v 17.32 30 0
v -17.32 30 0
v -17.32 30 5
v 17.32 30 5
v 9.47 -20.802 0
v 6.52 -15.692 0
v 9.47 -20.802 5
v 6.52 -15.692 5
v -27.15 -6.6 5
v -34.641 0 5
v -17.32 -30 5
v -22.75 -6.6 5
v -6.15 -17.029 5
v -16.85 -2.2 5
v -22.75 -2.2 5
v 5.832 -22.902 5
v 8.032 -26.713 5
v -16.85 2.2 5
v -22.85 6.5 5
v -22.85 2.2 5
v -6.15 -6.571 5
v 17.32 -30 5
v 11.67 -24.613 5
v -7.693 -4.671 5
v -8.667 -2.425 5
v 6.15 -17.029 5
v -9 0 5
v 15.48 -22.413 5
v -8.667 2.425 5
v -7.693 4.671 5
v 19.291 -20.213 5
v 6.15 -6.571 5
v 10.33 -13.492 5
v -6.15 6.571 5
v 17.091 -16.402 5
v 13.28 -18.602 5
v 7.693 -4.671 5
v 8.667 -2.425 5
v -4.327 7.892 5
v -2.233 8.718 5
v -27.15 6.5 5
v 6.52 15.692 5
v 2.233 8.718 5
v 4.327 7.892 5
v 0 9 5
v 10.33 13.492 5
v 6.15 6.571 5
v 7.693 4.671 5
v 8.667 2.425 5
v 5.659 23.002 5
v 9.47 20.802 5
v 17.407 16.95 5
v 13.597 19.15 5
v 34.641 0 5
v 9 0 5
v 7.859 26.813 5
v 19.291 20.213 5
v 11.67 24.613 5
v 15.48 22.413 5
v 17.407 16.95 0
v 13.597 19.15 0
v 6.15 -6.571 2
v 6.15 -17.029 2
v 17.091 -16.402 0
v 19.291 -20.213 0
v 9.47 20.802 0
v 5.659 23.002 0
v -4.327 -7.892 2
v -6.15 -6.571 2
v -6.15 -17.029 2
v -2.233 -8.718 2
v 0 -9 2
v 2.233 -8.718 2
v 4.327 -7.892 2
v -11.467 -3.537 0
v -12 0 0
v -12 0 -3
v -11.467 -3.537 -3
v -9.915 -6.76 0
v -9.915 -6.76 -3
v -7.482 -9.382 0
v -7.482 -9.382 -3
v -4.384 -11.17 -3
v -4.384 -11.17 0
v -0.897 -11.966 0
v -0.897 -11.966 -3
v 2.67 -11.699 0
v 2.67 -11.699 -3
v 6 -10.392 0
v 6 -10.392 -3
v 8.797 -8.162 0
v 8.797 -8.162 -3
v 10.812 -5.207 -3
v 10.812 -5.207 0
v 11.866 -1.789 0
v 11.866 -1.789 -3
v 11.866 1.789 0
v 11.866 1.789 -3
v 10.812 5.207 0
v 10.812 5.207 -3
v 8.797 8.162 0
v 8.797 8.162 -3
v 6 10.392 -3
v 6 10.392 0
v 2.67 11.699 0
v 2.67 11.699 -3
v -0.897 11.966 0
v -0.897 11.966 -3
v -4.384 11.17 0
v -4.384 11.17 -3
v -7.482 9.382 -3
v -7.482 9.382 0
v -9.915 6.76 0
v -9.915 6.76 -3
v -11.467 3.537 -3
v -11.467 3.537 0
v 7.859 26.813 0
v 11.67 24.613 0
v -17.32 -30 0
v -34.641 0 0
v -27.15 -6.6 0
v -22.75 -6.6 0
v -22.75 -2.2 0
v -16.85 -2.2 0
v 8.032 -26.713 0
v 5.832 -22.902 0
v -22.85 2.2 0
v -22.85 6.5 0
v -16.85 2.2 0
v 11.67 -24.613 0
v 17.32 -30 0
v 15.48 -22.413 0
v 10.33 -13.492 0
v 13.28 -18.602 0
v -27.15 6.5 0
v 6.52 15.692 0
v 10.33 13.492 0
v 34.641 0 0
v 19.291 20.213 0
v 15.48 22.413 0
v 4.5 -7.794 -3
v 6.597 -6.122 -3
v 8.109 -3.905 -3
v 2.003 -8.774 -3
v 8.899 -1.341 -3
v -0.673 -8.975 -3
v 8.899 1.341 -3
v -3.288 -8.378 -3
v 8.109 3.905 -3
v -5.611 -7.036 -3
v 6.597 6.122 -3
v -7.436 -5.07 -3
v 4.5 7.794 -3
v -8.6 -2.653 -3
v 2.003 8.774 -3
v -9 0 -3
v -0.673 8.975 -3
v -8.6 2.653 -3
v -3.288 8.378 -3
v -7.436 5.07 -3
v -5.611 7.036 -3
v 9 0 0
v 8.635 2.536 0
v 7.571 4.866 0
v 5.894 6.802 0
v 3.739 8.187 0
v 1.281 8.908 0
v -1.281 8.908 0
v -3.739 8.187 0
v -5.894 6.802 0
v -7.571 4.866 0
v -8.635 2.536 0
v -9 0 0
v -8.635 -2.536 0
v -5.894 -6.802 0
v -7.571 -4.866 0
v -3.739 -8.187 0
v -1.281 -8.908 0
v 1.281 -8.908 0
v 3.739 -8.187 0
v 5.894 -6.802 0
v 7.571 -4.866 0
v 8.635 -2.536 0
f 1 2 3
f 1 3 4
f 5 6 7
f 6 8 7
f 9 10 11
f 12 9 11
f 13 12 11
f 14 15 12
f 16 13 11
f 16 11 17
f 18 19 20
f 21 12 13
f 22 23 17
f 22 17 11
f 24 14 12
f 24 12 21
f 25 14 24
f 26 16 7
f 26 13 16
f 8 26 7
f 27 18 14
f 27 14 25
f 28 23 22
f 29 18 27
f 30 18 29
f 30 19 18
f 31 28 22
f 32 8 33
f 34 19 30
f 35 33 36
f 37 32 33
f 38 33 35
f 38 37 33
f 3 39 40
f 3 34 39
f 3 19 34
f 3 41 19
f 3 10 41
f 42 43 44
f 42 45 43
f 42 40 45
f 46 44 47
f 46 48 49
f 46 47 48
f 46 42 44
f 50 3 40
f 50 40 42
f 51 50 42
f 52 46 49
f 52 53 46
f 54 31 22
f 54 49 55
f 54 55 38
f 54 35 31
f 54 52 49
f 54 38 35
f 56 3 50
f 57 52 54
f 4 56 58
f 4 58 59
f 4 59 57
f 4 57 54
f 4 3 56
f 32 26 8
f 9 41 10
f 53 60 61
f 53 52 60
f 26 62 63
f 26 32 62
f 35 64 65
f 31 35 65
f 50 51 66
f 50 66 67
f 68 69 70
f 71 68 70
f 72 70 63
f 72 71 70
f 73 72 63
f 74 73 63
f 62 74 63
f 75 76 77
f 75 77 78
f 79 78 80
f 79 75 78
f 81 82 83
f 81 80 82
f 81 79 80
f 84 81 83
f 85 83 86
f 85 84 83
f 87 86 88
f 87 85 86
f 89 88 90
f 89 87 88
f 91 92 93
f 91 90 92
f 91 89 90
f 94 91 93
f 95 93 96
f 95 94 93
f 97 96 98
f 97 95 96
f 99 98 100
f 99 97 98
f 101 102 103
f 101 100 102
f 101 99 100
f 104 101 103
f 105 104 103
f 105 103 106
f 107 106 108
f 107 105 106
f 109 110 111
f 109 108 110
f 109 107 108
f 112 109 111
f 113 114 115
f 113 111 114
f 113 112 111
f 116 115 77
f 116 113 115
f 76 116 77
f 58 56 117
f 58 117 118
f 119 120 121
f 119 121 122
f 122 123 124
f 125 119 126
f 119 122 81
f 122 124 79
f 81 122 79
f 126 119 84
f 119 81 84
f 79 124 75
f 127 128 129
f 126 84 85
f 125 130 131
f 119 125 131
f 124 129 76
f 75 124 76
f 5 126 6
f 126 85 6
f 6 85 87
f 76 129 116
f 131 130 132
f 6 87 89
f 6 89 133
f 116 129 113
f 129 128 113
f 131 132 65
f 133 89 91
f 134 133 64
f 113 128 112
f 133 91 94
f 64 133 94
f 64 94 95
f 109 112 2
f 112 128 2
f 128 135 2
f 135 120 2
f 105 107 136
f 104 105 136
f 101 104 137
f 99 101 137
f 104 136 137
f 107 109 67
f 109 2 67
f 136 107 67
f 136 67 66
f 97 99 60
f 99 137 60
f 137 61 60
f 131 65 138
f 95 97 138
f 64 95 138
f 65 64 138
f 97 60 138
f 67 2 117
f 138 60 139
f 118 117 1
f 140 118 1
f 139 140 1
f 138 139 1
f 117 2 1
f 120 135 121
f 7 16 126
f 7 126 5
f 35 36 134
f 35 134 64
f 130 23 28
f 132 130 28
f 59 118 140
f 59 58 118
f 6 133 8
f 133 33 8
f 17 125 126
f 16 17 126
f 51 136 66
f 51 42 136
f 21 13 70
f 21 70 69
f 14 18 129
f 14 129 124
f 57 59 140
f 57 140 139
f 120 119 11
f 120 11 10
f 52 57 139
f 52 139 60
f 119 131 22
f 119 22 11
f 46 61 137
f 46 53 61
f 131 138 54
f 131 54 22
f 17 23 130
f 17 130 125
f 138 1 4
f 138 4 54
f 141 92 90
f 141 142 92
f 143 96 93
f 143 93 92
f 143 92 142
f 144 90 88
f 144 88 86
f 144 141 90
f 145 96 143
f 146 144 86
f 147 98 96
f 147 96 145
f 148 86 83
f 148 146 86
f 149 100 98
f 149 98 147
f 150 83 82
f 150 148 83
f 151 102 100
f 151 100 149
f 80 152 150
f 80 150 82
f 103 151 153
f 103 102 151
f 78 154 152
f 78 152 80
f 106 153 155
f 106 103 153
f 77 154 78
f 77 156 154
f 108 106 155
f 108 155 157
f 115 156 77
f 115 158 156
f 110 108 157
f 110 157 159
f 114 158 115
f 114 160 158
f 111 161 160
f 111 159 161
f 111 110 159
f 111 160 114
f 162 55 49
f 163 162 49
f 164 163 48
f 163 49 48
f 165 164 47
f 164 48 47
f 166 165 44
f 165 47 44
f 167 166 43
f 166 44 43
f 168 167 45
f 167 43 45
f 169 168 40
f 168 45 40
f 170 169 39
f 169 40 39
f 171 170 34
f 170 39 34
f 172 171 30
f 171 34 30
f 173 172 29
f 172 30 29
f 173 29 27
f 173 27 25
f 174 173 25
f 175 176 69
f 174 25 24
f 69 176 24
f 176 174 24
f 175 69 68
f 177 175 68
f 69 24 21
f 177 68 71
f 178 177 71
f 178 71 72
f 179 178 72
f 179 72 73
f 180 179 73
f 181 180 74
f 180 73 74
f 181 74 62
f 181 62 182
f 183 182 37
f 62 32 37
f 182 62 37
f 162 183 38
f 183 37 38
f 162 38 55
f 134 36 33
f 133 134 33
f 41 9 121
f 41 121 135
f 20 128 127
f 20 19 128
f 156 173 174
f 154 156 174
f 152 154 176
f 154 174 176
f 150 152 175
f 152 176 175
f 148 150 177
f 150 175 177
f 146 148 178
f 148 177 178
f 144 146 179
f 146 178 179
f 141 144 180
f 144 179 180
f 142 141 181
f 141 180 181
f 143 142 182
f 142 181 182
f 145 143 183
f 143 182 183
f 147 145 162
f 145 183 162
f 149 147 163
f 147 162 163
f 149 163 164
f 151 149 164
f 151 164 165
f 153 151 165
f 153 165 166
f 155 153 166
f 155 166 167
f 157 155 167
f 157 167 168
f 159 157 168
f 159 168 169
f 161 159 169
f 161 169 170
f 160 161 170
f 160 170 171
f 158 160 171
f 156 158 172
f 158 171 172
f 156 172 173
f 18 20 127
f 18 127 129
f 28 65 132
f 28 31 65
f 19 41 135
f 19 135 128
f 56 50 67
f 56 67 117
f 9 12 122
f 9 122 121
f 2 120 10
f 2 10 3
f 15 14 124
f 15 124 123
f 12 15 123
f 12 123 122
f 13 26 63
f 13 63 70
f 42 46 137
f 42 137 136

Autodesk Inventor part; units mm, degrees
ref_plane "YZ Plane" through (0, 0, 0) normal (1, 0, 0) x (0, 1, 0)
ref_plane "XZ Plane" through (0, 0, 0) normal (0, 1, 0) x (-1, 0, 0)
ref_plane "XY Plane" through (0, 0, 0) normal (0, 0, 1) x (1, 0, 0)
sketch "Boceto1" plane through (0, 0, 0) normal (0, 0, 1) x (1, 0, 0)
  line L0 (17.3205, 30) -> (34.641, 0)
  line L1 (34.641, 0) -> (17.3205, -30)
  line L2 (17.3205, -30) -> (-17.3205, -30)
  line L3 (-17.3205, -30) -> (-34.641, 0)
  line L4 (-34.641, 0) -> (-17.3205, 30)
  line L5 (-17.3205, 30) -> (17.3205, 30)
  point P0 (0, 0)
  point P1 (0, 0)
  dimension "d0" = 30
extrude "Extrusión1" add sketch "Boceto1" along normal blind 5
sketch "Boceto3" plane through (0, 0, 5) normal (0, 0, 1) x (1, 0, 0)
  circle A0 centre (0, 0) radius 9
  dimension "d5" = 18
extrude "Extrusión3" cut sketch "Boceto3" against normal blind 10
sketch "Boceto4" plane through (0, 0, 5) normal (0, 0, 1) x (1, 0, 0)
  circle A0 centre (0, 0) radius 9 projected
  line L0 (-6.15, 6.571) -> (6.15, 6.571)
  line L1 (6.15, 6.571) -> (6.15, -17.029)
  line L2 (6.15, -17.029) -> (-6.15, -17.029)
  line L3 (-6.15, -17.029) -> (-6.15, 6.571)
  point P0 (0, 6.571)
  dimension "d10" = 12.3
  dimension "d11" = 23.6
extrude "Extrusión4" cut sketch "Boceto4" against normal blind 3 contours L1 A0 L3 L0 | L1 L2 L3 A0
sketch "Boceto5" plane through (0, 0, 5) normal (0, 0, 1) x (1, 0, 0)
  line L0 (6.15, -17.029) -> (-6.15, -17.029) projected
  line L1 (34.641, 0) -> (17.3205, 30) projected
  line L2 (-34.641, 0) -> (-17.3205, -30) projected
  line L3 (-17.3205, -30) -> (17.3205, -30) projected
  line L4 (17.3205, -30) -> (34.641, 0) projected
  line L5 (6.5197, 15.6925) -> (11.6697, 24.6126)
  line L6 (11.6697, 24.6126) -> (15.4803, 22.4126)
  line L7 (15.4803, 22.4126) -> (10.3303, 13.4925)
  line L8 (10.3303, 13.4925) -> (6.5197, 15.6925)
  line L9 (6.5197, 15.6925) -> (15.4803, 22.4126) construction
  line L10 (11.6697, 24.6126) -> (10.3303, 13.4925) construction
  line L11 (-16.85, -2.2) -> (-27.15, -2.2)
  line L12 (-27.15, -2.2) -> (-27.15, 2.2)
  line L13 (-27.15, 2.2) -> (-16.85, 2.2)
  line L14 (-16.85, 2.2) -> (-16.85, -2.2)
  line L15 (-16.85, -2.2) -> (-27.15, 2.2) construction
  line L16 (-27.15, -2.2) -> (-16.85, 2.2) construction
  line L17 (6.5197, -15.6925) -> (11.6697, -24.6126)
  line L18 (11.6697, -24.6126) -> (15.4803, -22.4126)
  line L19 (15.4803, -22.4126) -> (10.3303, -13.4925)
  line L20 (10.3303, -13.4925) -> (6.5197, -15.6925)
  line L21 (6.5197, -15.6925) -> (15.4803, -22.4126) construction
  line L22 (11.6697, -24.6126) -> (10.3303, -13.4925) construction
  arc A0 (6.15, -6.571) -> (-6.15, -6.571) centre (0, 0) ccw projected
  line L23 (-17.3205, 30) -> (-34.641, 0) projected
  line L24 (0, 0) -> (17.3205, 30)
  line L25 (0, 0) -> (17.3205, -30)
  line L26 (-27.15, -2.2) -> (-22.85, -2.2)
  line L27 (-27.15, -2.2) -> (-22.75, -2.2)
  line L28 (-22.75, -2.2) -> (-22.75, -6.6)
  line L29 (-22.75, -6.6) -> (-27.15, -6.6)
  line L30 (-27.15, -6.6) -> (-27.15, -2.2)
  line L31 (15.4803, -22.4126) -> (13.2803, -18.6021)
  line L32 (13.2803, -18.6021) -> (17.0908, -16.4021)
  line L33 (17.0908, -16.4021) -> (19.2908, -20.2126)
  line L34 (19.2908, -20.2126) -> (15.4803, -22.4126)
  line L35 (11.6697, 24.6126) -> (9.4697, 20.8021)
  line L36 (9.4697, 20.8021) -> (5.6592, 23.0021)
  line L37 (5.6592, 23.0021) -> (7.8592, 26.8126)
  line L38 (7.8592, 26.8126) -> (11.6697, 24.6126)
  line L39 (15.4803, 22.4126) -> (19.2908, 20.2126)
  line L40 (19.2908, 20.2126) -> (17.4071, 16.95)
  line L41 (17.4071, 16.95) -> (13.5966, 19.15)
  line L42 (13.5966, 19.15) -> (15.4803, 22.4126)
  line L43 (11.6697, -24.6126) -> (8.0324, -26.7126)
  line L44 (8.0324, -26.7126) -> (5.8324, -22.9021)
  line L45 (5.8324, -22.9021) -> (9.4697, -20.8021)
  line L46 (9.4697, -20.8021) -> (11.6697, -24.6126)
  line L47 (-27.15, 2.2) -> (-27.15, 6.5)
  line L48 (-27.15, 6.5) -> (-22.85, 6.5)
  line L49 (-22.85, 6.5) -> (-22.85, 2.2)
  line L50 (-22.85, 2.2) -> (-27.15, 2.2)
  point P0 (11, 19.0526)
  point P1 (-22, 0)
  point P2 (11, -19.0526)
  point P3 (-22, 0)
  point P4 (-22, 0)
  point P5 (12.5, 21.6506)
  point P6 (13.575, 23.5126)
  point P7 (11, 19.0526)
  point P8 (11, -19.0526)
  point P9 (12.5, -21.6506)
  point P10 (-27.15, 0)
  point P11 (13.575, -23.5126)
  dimension "d16" = 4.4
  dimension "d17" = 10.3
  dimension "d18" = 4.4
  dimension "d20" = 4.4
  dimension "d21" = 10.3
  dimension "d47" = 22
  dimension "d48" = 22
  dimension "d49" = 22
  dimension "d60" = 4.4
  dimension "d61" = 4.4
  dimension "d62" = 4.4
  dimension "d63" = 4.4
  dimension "d64" = 4.4
  dimension "d65" = 4.4
  dimension "d68" = 4.4
  dimension "d69" = 4.4
  dimension "d70" = 4.3
sketch "Boceto9" plane through (0, 0, 0) normal (0, 0, -1) x (-1, 0, 0)
  circle A0 centre (0, 0) radius 9 projected
  circle A1 centre (0, 0) radius 12
  circle A2 centre (0, 0) radius 9
extrude "Extrusión9" add sketch "Boceto9" along normal blind 3
extrude "Extrusión11" cut sketch "Boceto5" against normal blind 10 contours L24 L8 L5 L6 | L6 L7 L8 L24 | L25 L20 L19 L18 | L18 L17 L20 L25 | L5 L36 L37 L38 | L39 L40 L41 L7 | L43 L44 L45 L17 | L19 L32 L33 L34 | L11 L12 L13 L14 | L28 L29 L30 L11 | L13 L47 L48 L49
properties part number "Base"
